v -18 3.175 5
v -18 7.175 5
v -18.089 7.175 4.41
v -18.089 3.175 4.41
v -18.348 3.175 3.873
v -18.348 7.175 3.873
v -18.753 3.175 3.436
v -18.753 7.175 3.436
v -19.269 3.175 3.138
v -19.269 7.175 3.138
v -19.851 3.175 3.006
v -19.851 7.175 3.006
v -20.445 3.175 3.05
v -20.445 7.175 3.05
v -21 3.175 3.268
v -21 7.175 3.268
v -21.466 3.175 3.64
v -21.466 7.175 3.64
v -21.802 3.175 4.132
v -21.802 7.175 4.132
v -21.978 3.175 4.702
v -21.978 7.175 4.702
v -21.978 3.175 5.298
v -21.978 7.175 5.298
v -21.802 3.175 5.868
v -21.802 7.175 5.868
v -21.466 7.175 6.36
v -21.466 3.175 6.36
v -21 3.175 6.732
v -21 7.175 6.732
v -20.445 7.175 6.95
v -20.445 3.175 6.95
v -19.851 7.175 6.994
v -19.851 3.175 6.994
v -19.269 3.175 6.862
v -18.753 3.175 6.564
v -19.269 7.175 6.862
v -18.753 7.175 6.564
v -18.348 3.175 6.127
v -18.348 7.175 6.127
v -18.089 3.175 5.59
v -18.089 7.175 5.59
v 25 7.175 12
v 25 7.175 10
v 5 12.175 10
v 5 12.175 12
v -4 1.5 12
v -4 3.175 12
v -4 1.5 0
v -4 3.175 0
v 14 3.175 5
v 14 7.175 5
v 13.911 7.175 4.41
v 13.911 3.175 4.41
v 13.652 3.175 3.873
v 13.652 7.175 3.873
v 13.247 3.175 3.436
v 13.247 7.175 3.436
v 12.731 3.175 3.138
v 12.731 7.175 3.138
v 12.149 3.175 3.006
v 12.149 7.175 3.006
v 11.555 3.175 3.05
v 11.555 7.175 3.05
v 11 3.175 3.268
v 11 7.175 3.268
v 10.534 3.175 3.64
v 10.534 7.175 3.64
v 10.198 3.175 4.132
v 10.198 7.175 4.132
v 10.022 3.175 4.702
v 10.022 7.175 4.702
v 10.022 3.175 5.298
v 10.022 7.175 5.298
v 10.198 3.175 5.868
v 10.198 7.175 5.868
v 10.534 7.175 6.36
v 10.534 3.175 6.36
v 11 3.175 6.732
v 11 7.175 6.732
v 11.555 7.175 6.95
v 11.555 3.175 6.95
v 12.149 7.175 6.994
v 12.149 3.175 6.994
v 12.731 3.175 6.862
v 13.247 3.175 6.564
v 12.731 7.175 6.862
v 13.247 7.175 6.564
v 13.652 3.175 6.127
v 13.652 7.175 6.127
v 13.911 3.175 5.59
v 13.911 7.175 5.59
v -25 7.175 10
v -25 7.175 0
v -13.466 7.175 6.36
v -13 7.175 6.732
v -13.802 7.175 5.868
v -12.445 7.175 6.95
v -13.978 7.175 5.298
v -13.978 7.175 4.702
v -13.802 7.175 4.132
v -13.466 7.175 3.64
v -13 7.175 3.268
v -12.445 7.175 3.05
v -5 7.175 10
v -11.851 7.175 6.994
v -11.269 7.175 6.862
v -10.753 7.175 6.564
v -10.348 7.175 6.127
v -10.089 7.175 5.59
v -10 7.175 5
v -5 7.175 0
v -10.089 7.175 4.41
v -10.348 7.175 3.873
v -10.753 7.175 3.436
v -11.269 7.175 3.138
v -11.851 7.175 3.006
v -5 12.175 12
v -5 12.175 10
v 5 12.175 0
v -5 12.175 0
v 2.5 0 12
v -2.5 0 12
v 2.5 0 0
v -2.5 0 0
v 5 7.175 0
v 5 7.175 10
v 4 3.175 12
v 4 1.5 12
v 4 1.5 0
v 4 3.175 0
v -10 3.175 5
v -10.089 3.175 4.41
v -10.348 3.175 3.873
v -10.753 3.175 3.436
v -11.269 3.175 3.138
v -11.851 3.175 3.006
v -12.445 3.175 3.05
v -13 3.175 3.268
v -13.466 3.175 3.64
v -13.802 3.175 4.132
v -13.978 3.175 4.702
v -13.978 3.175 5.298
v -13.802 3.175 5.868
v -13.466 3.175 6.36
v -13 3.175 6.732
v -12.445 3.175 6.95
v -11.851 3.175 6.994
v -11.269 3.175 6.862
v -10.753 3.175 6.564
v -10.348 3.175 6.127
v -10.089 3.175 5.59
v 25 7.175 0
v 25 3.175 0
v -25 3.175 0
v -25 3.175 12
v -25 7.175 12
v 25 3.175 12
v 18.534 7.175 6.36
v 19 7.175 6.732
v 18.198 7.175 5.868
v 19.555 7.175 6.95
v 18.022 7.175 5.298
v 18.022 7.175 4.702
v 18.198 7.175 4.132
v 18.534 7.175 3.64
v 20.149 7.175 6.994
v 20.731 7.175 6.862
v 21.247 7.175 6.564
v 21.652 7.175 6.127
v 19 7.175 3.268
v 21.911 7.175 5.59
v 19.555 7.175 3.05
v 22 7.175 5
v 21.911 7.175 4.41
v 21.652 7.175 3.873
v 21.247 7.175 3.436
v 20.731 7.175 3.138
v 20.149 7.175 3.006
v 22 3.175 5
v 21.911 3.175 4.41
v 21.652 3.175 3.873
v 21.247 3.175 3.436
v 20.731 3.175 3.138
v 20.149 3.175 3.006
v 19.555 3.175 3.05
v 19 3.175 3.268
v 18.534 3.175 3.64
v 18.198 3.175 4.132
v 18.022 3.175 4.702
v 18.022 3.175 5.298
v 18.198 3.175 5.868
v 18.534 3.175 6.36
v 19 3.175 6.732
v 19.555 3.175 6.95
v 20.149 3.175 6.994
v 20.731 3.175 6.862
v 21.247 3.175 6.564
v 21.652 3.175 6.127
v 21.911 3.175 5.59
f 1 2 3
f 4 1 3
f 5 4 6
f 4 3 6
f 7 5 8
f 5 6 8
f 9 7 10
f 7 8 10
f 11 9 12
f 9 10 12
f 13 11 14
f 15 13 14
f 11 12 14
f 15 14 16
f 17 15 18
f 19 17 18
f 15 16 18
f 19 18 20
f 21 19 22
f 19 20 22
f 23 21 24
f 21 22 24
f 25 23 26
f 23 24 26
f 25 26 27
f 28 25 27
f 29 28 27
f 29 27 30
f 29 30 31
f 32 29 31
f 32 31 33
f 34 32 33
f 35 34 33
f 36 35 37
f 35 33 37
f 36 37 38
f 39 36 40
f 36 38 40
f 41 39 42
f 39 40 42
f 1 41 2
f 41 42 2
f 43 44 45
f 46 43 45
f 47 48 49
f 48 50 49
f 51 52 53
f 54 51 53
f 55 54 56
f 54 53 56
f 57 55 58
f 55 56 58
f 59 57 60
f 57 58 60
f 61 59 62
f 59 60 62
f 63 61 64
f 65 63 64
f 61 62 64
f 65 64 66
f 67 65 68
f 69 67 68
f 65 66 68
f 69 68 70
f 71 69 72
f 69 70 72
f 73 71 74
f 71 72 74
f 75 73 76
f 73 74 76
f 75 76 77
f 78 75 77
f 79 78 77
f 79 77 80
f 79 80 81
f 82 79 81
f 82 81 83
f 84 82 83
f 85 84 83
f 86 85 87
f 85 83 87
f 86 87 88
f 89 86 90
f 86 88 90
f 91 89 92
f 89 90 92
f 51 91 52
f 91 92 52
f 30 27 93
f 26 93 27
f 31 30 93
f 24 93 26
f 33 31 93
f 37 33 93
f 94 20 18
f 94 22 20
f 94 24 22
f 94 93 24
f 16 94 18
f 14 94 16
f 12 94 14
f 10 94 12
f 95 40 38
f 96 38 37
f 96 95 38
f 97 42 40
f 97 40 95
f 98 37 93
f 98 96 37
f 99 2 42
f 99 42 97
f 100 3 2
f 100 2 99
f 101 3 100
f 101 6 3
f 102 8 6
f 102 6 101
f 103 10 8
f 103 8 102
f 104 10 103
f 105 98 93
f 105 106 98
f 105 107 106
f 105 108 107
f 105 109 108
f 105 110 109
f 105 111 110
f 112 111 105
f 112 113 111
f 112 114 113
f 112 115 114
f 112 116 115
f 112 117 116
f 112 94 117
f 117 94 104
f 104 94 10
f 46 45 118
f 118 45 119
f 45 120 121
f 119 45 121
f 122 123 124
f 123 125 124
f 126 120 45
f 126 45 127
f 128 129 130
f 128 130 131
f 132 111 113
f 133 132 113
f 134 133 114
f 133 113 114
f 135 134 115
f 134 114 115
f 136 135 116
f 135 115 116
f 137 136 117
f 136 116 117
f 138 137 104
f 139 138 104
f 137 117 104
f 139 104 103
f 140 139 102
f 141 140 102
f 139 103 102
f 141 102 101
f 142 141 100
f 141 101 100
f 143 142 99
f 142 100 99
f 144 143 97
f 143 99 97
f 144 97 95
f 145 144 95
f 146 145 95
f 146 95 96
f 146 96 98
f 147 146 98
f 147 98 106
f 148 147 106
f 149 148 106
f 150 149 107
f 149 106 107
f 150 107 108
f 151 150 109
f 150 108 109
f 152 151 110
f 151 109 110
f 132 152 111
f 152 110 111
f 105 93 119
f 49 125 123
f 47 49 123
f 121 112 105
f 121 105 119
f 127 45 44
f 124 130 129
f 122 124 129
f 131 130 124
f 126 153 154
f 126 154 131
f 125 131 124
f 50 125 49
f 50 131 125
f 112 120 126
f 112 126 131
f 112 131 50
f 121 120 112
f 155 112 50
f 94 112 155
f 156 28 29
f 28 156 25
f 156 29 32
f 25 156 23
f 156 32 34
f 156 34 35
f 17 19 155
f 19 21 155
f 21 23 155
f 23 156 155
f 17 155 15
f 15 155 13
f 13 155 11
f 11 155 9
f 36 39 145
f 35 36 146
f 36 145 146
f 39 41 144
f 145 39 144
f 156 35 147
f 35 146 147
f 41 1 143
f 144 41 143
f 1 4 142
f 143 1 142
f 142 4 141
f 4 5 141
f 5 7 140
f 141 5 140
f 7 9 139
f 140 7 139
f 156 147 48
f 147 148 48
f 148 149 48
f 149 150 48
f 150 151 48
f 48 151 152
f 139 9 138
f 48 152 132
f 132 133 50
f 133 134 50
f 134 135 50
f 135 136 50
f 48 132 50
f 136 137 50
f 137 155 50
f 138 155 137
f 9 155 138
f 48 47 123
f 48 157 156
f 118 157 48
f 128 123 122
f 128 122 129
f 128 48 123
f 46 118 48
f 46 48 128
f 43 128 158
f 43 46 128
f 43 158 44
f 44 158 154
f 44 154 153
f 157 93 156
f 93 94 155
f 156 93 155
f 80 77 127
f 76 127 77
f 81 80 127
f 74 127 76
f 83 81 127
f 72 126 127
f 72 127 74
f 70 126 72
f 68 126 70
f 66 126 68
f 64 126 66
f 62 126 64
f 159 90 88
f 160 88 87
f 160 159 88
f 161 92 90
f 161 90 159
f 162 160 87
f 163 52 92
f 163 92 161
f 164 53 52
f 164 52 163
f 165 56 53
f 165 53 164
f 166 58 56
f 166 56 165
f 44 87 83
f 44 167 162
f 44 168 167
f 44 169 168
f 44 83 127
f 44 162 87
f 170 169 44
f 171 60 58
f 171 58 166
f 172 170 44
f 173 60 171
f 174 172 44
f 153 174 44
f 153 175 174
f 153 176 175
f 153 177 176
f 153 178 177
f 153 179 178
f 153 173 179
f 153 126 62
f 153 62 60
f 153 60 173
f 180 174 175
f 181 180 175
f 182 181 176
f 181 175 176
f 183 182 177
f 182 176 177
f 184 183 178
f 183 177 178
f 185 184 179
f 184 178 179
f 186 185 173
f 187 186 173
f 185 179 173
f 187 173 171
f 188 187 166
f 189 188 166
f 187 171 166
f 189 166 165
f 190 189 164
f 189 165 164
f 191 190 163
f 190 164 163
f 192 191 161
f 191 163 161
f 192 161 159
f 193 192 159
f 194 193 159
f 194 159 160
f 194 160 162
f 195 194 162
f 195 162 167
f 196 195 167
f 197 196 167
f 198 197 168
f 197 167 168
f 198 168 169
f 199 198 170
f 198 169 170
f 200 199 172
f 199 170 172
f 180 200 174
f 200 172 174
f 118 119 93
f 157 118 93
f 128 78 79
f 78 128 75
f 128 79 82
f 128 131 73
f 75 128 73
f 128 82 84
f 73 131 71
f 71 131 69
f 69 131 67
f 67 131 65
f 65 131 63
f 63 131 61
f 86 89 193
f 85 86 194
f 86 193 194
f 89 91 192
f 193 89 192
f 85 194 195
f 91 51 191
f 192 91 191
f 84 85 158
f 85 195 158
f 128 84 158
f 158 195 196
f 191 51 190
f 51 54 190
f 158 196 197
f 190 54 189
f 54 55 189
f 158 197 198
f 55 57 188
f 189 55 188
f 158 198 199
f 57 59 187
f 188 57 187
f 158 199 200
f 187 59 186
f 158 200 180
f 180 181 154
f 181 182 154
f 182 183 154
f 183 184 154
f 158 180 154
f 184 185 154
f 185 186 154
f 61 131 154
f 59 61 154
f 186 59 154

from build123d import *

# Parameters (mm, degrees)
BOSS_EXTRUDE1_DEPTH = 10
BOSS_EXTRUDE2_DEPTH = 2
SKETCH3_R           = 2
CUT_EXTRUDE1_DEPTH  = 4
CHAMFER1_SIZE       = 1.5


with BuildPart() as part:
    # Sketch1 → Boss-Extrude1 (new body)
    with BuildSketch(Plane.XY):
        Polygon((-25, 3.175), (-25, 7.175), (-5, 7.175), (-5, 12.175), (5, 12.175), (5, 7.175), (25, 7.175), (25, 3.175), (4, 3.175), (4, 0), (-4, 0), (-4, 3.175), align=None)
    extrude(amount=BOSS_EXTRUDE1_DEPTH)

    # Sketch2 → Boss-Extrude2 (add)
    with BuildSketch(Plane.XY.offset(10)):
        Polygon((-5, 12.175), (-25, 7.175), (-25, 3.175), (-4, 3.175), (-4, 0), (4, 0), (4, 3.175), (25, 3.175), (25, 7.175), (5, 12.175), align=None)
    extrude(amount=BOSS_EXTRUDE2_DEPTH)

    # Sketch3 → Cut-Extrude1 (cut)
    with BuildSketch(Plane(origin=(0, 7.175, 0), x_dir=(1, 0, 0), z_dir=(0, 1, 0))):
        with Locations((12, -5)):
            Circle(SKETCH3_R)
        with Locations((20, -5)):
            Circle(SKETCH3_R)
        with Locations((-12, -5)):
            Circle(SKETCH3_R)
        with Locations((-20, -5)):
            Circle(SKETCH3_R)
    extrude(amount=-CUT_EXTRUDE1_DEPTH, mode=Mode.SUBTRACT)

    # Chamfer1
    chamfer1_edges = [part.edges().sort_by_distance(p)[0] for p in [
        (4, 0, 6),
        (-4, 0, 6),
    ]]
    chamfer(chamfer1_edges, length=CHAMFER1_SIZE)


solid = part.part
